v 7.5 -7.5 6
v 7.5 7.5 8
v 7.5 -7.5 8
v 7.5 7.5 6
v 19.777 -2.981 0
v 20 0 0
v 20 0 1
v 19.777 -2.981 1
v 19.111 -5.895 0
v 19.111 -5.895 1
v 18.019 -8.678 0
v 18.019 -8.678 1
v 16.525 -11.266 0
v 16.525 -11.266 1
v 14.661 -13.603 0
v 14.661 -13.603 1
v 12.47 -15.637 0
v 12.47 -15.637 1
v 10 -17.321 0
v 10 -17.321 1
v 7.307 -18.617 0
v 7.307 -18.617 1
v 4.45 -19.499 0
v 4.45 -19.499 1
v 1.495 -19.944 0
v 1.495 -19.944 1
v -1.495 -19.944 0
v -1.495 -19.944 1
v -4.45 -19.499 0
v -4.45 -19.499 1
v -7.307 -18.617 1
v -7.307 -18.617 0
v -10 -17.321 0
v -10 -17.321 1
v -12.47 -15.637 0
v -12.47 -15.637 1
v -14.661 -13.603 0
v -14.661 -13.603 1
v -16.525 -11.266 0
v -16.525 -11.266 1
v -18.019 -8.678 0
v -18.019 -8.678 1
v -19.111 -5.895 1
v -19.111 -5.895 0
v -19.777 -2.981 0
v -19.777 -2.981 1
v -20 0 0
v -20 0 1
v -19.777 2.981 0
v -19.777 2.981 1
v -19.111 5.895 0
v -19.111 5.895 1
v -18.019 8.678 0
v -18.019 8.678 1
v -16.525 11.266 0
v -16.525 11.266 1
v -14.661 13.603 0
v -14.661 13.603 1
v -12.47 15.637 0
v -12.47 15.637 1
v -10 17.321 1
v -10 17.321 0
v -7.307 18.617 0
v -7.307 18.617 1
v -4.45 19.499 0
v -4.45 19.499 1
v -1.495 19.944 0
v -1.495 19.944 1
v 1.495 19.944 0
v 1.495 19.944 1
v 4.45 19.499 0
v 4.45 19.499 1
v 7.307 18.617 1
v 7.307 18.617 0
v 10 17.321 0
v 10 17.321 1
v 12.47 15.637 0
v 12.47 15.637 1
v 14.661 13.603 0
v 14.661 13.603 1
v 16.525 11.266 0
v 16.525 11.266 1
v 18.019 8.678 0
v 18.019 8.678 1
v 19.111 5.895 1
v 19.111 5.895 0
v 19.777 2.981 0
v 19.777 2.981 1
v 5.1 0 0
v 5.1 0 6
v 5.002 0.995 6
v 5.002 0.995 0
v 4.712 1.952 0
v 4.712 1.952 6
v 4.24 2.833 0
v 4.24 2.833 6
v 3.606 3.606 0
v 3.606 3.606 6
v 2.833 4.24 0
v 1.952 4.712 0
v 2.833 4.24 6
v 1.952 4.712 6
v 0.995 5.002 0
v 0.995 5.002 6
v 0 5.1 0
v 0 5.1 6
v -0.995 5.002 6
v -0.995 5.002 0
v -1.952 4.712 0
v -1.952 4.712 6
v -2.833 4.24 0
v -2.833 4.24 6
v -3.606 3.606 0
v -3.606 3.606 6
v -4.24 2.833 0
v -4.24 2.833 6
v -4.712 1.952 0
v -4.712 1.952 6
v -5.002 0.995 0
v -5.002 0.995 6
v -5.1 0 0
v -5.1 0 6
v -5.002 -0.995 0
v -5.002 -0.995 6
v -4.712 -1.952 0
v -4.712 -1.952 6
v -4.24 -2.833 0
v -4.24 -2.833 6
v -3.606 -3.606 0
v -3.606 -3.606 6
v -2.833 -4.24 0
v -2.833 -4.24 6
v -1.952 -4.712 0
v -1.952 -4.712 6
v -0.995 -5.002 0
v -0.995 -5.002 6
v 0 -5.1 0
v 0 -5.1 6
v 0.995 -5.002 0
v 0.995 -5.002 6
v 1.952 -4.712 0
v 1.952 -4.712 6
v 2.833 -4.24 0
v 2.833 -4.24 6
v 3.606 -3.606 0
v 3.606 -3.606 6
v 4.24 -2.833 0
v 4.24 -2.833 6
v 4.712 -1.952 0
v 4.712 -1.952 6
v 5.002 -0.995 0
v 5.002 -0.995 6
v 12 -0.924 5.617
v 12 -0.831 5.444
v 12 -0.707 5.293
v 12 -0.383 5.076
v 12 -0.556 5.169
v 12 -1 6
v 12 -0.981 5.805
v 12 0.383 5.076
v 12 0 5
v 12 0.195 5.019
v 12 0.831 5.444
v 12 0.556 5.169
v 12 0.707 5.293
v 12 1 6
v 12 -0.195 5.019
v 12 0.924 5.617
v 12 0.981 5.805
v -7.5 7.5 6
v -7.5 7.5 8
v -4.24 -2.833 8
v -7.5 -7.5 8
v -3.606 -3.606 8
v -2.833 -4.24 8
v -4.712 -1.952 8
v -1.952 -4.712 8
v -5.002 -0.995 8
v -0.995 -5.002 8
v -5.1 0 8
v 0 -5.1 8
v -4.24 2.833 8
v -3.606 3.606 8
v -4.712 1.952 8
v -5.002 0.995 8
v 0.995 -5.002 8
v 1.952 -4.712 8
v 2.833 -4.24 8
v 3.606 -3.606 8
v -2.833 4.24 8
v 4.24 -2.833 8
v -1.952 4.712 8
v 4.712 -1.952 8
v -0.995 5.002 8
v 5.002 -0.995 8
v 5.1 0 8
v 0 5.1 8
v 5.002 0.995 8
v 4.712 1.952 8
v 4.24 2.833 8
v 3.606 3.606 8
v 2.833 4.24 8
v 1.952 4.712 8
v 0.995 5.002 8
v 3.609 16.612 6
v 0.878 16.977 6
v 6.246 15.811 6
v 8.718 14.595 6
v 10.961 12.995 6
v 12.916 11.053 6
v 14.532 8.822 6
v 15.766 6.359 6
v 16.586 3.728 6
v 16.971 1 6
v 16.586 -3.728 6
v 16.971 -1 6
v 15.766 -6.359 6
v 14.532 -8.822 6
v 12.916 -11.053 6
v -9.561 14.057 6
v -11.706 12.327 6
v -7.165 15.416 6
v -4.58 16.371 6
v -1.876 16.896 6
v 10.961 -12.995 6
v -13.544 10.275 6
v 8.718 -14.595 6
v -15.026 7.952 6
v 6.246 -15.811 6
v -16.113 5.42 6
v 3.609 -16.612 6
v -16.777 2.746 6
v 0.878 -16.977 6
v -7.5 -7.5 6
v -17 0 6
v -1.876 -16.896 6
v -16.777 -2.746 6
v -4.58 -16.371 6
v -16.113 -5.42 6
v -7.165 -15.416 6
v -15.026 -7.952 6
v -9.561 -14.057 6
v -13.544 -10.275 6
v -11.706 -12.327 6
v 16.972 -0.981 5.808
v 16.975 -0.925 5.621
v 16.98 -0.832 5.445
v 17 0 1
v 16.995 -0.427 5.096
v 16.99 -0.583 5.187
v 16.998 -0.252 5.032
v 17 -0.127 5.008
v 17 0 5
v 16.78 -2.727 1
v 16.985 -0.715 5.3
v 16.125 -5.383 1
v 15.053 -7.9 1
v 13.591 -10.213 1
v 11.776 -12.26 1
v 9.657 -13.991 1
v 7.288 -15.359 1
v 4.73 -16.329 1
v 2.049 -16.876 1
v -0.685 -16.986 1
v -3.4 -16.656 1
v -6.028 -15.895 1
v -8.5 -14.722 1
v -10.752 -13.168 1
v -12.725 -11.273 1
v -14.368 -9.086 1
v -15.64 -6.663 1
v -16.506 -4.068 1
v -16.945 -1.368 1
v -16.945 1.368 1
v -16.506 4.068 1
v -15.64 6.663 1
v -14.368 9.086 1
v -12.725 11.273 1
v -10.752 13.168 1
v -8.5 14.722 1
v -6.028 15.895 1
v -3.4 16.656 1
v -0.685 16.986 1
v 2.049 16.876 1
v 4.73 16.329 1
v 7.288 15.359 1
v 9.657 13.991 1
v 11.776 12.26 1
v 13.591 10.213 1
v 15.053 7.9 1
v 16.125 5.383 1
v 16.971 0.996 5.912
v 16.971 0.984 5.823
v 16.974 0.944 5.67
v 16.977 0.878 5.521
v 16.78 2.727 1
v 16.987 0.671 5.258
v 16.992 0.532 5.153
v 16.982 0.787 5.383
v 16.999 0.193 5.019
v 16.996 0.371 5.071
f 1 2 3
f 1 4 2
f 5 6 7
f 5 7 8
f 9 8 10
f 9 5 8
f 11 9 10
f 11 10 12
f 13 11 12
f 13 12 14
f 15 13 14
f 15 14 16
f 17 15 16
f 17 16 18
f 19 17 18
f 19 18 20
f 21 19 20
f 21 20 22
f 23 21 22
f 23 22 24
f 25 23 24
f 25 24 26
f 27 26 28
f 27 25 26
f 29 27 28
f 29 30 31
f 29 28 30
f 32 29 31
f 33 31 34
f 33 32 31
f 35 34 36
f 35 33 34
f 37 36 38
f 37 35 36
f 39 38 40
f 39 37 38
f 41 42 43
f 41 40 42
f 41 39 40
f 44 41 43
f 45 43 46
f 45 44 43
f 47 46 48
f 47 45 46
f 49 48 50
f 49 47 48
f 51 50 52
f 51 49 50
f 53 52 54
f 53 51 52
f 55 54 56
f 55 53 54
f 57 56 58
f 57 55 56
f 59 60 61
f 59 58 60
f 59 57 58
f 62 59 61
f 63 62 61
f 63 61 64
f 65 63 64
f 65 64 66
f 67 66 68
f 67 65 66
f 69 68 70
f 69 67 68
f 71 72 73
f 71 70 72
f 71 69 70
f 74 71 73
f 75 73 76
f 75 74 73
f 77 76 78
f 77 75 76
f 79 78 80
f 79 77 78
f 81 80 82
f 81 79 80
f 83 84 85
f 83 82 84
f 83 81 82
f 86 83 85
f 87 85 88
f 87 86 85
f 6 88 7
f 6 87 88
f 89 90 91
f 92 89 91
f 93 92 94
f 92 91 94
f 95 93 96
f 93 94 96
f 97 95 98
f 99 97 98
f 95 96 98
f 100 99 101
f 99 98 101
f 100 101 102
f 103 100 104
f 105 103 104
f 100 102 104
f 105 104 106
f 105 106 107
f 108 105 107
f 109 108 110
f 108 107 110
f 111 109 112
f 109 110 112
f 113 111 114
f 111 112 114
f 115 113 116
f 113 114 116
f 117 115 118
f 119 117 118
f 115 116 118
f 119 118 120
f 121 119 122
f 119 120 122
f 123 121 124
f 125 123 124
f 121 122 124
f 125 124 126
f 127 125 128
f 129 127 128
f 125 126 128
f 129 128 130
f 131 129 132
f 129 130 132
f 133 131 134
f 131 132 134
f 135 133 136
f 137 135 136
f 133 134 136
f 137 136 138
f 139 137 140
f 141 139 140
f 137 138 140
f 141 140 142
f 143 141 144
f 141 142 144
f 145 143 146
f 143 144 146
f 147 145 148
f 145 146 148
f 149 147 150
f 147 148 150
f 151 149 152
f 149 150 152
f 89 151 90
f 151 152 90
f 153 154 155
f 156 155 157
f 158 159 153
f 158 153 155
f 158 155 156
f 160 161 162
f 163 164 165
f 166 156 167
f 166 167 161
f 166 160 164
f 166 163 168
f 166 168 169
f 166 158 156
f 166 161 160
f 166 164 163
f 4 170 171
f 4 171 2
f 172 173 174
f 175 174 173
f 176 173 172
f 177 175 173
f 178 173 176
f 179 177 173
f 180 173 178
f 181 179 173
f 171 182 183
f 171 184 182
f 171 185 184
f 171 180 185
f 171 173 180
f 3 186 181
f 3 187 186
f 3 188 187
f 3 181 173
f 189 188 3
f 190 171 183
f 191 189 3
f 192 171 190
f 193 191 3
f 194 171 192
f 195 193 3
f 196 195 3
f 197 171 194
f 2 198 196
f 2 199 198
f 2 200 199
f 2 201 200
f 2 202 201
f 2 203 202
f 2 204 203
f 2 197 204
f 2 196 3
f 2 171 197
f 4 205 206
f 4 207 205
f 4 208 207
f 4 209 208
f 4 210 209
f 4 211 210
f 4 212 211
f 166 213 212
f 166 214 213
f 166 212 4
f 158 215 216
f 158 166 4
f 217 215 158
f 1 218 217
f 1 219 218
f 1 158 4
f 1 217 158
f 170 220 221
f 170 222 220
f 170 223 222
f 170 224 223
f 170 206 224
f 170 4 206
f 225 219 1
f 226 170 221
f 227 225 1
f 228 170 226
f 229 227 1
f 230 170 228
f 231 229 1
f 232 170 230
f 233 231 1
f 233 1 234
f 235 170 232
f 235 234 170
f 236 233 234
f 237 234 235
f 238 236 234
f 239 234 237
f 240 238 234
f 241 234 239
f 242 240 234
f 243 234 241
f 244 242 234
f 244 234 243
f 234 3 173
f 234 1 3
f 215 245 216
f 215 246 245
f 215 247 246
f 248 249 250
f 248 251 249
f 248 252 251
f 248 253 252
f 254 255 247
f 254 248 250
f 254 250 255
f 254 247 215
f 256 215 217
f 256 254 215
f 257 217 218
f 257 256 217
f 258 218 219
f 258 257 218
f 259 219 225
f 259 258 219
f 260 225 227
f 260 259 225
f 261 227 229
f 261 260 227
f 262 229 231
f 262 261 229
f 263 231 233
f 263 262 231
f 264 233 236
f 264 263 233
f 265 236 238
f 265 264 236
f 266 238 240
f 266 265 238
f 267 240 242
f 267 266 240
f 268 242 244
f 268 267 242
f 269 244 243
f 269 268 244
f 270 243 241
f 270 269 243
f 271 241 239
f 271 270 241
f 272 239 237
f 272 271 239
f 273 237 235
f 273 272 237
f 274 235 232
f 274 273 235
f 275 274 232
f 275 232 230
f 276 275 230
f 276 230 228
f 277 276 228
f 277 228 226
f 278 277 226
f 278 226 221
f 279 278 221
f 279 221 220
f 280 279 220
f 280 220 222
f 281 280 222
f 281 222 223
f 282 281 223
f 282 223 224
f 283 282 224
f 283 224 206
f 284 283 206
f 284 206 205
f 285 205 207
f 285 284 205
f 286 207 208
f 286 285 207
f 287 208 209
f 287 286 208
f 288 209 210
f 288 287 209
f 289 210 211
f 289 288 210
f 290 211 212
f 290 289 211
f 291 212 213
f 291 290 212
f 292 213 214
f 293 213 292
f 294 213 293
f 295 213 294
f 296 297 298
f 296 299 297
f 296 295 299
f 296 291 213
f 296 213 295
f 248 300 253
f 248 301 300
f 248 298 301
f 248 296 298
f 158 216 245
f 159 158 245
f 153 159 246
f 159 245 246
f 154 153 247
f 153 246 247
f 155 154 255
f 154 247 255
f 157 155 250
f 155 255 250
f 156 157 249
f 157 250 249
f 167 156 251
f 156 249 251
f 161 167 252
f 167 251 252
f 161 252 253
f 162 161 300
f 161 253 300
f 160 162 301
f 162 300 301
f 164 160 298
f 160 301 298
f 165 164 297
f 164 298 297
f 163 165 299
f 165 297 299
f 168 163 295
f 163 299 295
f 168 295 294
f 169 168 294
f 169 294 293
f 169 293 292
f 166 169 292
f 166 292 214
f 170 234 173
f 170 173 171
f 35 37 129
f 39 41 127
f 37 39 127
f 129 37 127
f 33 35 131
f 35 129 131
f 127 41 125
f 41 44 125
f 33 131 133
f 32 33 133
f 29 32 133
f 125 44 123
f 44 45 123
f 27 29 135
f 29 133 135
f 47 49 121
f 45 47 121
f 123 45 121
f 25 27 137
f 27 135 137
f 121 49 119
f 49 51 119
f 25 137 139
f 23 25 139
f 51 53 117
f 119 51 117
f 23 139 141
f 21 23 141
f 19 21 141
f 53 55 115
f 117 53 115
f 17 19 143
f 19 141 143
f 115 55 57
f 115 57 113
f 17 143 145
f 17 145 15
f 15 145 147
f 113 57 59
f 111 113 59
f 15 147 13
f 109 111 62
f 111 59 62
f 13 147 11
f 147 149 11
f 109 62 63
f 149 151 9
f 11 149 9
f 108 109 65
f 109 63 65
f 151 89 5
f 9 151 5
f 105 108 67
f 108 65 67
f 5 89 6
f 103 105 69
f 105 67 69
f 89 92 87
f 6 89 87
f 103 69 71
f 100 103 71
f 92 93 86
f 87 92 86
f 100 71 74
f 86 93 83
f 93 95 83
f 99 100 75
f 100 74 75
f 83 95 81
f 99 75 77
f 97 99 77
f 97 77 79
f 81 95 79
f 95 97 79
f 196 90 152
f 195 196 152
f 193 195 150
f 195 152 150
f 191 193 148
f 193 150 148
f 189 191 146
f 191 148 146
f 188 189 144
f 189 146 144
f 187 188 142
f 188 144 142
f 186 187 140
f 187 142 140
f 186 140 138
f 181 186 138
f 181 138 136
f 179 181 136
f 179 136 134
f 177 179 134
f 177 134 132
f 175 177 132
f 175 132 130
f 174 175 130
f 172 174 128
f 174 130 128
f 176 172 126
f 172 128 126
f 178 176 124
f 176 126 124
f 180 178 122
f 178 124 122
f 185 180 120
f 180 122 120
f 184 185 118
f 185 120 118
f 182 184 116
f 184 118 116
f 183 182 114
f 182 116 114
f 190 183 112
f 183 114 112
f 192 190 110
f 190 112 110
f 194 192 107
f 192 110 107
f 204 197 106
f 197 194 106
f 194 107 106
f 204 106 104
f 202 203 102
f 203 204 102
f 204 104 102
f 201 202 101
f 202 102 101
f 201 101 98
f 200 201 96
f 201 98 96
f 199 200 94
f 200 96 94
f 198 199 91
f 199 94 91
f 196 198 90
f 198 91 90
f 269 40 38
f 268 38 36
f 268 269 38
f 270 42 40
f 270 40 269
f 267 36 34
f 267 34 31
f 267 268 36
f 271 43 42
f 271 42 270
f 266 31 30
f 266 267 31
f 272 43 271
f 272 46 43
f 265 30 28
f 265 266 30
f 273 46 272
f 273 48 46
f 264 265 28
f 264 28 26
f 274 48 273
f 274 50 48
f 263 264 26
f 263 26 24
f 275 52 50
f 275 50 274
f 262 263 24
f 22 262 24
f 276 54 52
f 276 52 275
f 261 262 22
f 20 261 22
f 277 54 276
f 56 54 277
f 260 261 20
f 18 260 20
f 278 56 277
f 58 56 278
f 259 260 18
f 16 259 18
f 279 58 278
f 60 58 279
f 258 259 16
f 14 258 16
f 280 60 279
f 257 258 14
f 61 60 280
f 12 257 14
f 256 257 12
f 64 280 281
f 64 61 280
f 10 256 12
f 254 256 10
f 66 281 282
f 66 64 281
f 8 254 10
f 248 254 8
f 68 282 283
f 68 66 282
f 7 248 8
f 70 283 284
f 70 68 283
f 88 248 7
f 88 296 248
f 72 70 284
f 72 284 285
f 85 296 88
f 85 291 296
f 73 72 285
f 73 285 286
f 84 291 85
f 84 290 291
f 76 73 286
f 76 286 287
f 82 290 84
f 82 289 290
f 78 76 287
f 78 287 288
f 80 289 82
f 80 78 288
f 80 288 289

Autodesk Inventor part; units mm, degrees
ref_plane "XZ Plane" through (0, 0, 0) normal (0, 1, 0) x (-1, 0, 0)
ref_plane "XY Plane" through (0, 0, 0) normal (0, 0, 1) x (1, 0, 0)
sketch "Skizze1" plane through (0, 0, 0) normal (0, 0, 1) x (1, 0, 0)
  circle A0 centre (0, 0) radius 20
  dimension "d0" = 40
extrude "Extrusion1" add sketch "Skizze1" along normal blind 1
sketch "Skizze2" plane through (0, 0, 1) normal (0, 0, 1) x (1, 0, 0)
  circle A0 centre (0, 0) radius 20 projected
  circle A1 centre (0, 0) radius 17
  dimension "d3" = 34
extrude "Extrusion2" add sketch "Skizze2" along normal blind 10 contours A1
sketch "Skizze3" plane through (0, 0, 11) normal (0, 0, 1) x (1, 0, 0)
  circle A0 centre (0, 0) radius 17 projected
  circle A1 centre (0, 0) radius 20
  dimension "d6" = 40
extrude "Extrusion3" add sketch "Skizze3" along normal blind 1 contours A0 | A1
sketch "Skizze6" plane through (0, 0, 12) normal (0, 0, 1) x (1, 0, 0)
  circle A0 centre (0, 0) radius 20 projected
  circle A1 centre (0, 0) radius 5.1
  dimension "d16" = 10.2
extrude "Extrusion6" cut sketch "Skizze6" against normal through all contours A1
sketch "Skizze7" plane through (0, 0, 0) normal (0, 1, 0) x (-1, 0, 0)
  line L0 (17, 1) -> (17, 11) projected
  line L1 (-17, 1) -> (-17, 11) projected
  line L2 (20, 0) -> (-20, 0) projected
  line L3 (20, 0) -> (20, 1) projected
  line L4 (20, 1) -> (-20, 1) projected
  line L5 (-17, 1) -> (-17, 11) projected
  line L6 (20, 0) -> (-20, 0)
  line L7 (-20, 0) -> (-20, 6)
  line L8 (-20, 6) -> (20, 6)
  line L9 (20, 6) -> (20, 0)
  line L10 (20, 12) -> (-20, 12) projected
  point P0 (0, 0)
  dimension "d19" = 6
  dimension "d20" = 12
extrude "Extrusion7" cut sketch "Skizze7" along normal through all both and the other way through all keep common part
ref_plane "Arbeitsebene2" through (17, 0, 0) normal (1, 0, 0) x (0, 1, 0)
sketch "Skizze9" plane through (17, 0, 0) normal (1, 0, 0) x (0, 1, 0)
  line L0 (17, 6) -> (-17, 6) projected
  circle A0 centre (0, 6) radius 1
  point P0 (0, 0)
  point P1 (-1, 6)
  point P2 (1, 6)
  dimension "d24" = 2
extrude "Extrusion8" cut sketch "Skizze9" against normal blind 5 contours A0 L0 picked at (0.0402, 5.6691)
sketch "Skizze10" plane through (12, 1, 6) normal (0, 0, 1) x (1, 0, 0)
  circle A0 centre (-12, -1) radius 5.1 projected
  line L0 (-19.5, 6.5) -> (-4.5, 6.5)
  line L1 (-4.5, 6.5) -> (-4.5, -8.5)
  line L2 (-4.5, -8.5) -> (-19.5, -8.5)
  line L3 (-19.5, -8.5) -> (-19.5, 6.5)
  line L4 (-19.5, 6.5) -> (-4.5, -8.5) construction
  line L5 (-4.5, 6.5) -> (-19.5, -8.5) construction
  dimension "d27" = 15
  dimension "d28" = 15
extrude "Extrusion9" add sketch "Skizze10" along normal blind 2
equation "\"d19\" = 0.5 * d20"
equation "\"d28\" = d27"
properties part number "Motorstange_version2a"
